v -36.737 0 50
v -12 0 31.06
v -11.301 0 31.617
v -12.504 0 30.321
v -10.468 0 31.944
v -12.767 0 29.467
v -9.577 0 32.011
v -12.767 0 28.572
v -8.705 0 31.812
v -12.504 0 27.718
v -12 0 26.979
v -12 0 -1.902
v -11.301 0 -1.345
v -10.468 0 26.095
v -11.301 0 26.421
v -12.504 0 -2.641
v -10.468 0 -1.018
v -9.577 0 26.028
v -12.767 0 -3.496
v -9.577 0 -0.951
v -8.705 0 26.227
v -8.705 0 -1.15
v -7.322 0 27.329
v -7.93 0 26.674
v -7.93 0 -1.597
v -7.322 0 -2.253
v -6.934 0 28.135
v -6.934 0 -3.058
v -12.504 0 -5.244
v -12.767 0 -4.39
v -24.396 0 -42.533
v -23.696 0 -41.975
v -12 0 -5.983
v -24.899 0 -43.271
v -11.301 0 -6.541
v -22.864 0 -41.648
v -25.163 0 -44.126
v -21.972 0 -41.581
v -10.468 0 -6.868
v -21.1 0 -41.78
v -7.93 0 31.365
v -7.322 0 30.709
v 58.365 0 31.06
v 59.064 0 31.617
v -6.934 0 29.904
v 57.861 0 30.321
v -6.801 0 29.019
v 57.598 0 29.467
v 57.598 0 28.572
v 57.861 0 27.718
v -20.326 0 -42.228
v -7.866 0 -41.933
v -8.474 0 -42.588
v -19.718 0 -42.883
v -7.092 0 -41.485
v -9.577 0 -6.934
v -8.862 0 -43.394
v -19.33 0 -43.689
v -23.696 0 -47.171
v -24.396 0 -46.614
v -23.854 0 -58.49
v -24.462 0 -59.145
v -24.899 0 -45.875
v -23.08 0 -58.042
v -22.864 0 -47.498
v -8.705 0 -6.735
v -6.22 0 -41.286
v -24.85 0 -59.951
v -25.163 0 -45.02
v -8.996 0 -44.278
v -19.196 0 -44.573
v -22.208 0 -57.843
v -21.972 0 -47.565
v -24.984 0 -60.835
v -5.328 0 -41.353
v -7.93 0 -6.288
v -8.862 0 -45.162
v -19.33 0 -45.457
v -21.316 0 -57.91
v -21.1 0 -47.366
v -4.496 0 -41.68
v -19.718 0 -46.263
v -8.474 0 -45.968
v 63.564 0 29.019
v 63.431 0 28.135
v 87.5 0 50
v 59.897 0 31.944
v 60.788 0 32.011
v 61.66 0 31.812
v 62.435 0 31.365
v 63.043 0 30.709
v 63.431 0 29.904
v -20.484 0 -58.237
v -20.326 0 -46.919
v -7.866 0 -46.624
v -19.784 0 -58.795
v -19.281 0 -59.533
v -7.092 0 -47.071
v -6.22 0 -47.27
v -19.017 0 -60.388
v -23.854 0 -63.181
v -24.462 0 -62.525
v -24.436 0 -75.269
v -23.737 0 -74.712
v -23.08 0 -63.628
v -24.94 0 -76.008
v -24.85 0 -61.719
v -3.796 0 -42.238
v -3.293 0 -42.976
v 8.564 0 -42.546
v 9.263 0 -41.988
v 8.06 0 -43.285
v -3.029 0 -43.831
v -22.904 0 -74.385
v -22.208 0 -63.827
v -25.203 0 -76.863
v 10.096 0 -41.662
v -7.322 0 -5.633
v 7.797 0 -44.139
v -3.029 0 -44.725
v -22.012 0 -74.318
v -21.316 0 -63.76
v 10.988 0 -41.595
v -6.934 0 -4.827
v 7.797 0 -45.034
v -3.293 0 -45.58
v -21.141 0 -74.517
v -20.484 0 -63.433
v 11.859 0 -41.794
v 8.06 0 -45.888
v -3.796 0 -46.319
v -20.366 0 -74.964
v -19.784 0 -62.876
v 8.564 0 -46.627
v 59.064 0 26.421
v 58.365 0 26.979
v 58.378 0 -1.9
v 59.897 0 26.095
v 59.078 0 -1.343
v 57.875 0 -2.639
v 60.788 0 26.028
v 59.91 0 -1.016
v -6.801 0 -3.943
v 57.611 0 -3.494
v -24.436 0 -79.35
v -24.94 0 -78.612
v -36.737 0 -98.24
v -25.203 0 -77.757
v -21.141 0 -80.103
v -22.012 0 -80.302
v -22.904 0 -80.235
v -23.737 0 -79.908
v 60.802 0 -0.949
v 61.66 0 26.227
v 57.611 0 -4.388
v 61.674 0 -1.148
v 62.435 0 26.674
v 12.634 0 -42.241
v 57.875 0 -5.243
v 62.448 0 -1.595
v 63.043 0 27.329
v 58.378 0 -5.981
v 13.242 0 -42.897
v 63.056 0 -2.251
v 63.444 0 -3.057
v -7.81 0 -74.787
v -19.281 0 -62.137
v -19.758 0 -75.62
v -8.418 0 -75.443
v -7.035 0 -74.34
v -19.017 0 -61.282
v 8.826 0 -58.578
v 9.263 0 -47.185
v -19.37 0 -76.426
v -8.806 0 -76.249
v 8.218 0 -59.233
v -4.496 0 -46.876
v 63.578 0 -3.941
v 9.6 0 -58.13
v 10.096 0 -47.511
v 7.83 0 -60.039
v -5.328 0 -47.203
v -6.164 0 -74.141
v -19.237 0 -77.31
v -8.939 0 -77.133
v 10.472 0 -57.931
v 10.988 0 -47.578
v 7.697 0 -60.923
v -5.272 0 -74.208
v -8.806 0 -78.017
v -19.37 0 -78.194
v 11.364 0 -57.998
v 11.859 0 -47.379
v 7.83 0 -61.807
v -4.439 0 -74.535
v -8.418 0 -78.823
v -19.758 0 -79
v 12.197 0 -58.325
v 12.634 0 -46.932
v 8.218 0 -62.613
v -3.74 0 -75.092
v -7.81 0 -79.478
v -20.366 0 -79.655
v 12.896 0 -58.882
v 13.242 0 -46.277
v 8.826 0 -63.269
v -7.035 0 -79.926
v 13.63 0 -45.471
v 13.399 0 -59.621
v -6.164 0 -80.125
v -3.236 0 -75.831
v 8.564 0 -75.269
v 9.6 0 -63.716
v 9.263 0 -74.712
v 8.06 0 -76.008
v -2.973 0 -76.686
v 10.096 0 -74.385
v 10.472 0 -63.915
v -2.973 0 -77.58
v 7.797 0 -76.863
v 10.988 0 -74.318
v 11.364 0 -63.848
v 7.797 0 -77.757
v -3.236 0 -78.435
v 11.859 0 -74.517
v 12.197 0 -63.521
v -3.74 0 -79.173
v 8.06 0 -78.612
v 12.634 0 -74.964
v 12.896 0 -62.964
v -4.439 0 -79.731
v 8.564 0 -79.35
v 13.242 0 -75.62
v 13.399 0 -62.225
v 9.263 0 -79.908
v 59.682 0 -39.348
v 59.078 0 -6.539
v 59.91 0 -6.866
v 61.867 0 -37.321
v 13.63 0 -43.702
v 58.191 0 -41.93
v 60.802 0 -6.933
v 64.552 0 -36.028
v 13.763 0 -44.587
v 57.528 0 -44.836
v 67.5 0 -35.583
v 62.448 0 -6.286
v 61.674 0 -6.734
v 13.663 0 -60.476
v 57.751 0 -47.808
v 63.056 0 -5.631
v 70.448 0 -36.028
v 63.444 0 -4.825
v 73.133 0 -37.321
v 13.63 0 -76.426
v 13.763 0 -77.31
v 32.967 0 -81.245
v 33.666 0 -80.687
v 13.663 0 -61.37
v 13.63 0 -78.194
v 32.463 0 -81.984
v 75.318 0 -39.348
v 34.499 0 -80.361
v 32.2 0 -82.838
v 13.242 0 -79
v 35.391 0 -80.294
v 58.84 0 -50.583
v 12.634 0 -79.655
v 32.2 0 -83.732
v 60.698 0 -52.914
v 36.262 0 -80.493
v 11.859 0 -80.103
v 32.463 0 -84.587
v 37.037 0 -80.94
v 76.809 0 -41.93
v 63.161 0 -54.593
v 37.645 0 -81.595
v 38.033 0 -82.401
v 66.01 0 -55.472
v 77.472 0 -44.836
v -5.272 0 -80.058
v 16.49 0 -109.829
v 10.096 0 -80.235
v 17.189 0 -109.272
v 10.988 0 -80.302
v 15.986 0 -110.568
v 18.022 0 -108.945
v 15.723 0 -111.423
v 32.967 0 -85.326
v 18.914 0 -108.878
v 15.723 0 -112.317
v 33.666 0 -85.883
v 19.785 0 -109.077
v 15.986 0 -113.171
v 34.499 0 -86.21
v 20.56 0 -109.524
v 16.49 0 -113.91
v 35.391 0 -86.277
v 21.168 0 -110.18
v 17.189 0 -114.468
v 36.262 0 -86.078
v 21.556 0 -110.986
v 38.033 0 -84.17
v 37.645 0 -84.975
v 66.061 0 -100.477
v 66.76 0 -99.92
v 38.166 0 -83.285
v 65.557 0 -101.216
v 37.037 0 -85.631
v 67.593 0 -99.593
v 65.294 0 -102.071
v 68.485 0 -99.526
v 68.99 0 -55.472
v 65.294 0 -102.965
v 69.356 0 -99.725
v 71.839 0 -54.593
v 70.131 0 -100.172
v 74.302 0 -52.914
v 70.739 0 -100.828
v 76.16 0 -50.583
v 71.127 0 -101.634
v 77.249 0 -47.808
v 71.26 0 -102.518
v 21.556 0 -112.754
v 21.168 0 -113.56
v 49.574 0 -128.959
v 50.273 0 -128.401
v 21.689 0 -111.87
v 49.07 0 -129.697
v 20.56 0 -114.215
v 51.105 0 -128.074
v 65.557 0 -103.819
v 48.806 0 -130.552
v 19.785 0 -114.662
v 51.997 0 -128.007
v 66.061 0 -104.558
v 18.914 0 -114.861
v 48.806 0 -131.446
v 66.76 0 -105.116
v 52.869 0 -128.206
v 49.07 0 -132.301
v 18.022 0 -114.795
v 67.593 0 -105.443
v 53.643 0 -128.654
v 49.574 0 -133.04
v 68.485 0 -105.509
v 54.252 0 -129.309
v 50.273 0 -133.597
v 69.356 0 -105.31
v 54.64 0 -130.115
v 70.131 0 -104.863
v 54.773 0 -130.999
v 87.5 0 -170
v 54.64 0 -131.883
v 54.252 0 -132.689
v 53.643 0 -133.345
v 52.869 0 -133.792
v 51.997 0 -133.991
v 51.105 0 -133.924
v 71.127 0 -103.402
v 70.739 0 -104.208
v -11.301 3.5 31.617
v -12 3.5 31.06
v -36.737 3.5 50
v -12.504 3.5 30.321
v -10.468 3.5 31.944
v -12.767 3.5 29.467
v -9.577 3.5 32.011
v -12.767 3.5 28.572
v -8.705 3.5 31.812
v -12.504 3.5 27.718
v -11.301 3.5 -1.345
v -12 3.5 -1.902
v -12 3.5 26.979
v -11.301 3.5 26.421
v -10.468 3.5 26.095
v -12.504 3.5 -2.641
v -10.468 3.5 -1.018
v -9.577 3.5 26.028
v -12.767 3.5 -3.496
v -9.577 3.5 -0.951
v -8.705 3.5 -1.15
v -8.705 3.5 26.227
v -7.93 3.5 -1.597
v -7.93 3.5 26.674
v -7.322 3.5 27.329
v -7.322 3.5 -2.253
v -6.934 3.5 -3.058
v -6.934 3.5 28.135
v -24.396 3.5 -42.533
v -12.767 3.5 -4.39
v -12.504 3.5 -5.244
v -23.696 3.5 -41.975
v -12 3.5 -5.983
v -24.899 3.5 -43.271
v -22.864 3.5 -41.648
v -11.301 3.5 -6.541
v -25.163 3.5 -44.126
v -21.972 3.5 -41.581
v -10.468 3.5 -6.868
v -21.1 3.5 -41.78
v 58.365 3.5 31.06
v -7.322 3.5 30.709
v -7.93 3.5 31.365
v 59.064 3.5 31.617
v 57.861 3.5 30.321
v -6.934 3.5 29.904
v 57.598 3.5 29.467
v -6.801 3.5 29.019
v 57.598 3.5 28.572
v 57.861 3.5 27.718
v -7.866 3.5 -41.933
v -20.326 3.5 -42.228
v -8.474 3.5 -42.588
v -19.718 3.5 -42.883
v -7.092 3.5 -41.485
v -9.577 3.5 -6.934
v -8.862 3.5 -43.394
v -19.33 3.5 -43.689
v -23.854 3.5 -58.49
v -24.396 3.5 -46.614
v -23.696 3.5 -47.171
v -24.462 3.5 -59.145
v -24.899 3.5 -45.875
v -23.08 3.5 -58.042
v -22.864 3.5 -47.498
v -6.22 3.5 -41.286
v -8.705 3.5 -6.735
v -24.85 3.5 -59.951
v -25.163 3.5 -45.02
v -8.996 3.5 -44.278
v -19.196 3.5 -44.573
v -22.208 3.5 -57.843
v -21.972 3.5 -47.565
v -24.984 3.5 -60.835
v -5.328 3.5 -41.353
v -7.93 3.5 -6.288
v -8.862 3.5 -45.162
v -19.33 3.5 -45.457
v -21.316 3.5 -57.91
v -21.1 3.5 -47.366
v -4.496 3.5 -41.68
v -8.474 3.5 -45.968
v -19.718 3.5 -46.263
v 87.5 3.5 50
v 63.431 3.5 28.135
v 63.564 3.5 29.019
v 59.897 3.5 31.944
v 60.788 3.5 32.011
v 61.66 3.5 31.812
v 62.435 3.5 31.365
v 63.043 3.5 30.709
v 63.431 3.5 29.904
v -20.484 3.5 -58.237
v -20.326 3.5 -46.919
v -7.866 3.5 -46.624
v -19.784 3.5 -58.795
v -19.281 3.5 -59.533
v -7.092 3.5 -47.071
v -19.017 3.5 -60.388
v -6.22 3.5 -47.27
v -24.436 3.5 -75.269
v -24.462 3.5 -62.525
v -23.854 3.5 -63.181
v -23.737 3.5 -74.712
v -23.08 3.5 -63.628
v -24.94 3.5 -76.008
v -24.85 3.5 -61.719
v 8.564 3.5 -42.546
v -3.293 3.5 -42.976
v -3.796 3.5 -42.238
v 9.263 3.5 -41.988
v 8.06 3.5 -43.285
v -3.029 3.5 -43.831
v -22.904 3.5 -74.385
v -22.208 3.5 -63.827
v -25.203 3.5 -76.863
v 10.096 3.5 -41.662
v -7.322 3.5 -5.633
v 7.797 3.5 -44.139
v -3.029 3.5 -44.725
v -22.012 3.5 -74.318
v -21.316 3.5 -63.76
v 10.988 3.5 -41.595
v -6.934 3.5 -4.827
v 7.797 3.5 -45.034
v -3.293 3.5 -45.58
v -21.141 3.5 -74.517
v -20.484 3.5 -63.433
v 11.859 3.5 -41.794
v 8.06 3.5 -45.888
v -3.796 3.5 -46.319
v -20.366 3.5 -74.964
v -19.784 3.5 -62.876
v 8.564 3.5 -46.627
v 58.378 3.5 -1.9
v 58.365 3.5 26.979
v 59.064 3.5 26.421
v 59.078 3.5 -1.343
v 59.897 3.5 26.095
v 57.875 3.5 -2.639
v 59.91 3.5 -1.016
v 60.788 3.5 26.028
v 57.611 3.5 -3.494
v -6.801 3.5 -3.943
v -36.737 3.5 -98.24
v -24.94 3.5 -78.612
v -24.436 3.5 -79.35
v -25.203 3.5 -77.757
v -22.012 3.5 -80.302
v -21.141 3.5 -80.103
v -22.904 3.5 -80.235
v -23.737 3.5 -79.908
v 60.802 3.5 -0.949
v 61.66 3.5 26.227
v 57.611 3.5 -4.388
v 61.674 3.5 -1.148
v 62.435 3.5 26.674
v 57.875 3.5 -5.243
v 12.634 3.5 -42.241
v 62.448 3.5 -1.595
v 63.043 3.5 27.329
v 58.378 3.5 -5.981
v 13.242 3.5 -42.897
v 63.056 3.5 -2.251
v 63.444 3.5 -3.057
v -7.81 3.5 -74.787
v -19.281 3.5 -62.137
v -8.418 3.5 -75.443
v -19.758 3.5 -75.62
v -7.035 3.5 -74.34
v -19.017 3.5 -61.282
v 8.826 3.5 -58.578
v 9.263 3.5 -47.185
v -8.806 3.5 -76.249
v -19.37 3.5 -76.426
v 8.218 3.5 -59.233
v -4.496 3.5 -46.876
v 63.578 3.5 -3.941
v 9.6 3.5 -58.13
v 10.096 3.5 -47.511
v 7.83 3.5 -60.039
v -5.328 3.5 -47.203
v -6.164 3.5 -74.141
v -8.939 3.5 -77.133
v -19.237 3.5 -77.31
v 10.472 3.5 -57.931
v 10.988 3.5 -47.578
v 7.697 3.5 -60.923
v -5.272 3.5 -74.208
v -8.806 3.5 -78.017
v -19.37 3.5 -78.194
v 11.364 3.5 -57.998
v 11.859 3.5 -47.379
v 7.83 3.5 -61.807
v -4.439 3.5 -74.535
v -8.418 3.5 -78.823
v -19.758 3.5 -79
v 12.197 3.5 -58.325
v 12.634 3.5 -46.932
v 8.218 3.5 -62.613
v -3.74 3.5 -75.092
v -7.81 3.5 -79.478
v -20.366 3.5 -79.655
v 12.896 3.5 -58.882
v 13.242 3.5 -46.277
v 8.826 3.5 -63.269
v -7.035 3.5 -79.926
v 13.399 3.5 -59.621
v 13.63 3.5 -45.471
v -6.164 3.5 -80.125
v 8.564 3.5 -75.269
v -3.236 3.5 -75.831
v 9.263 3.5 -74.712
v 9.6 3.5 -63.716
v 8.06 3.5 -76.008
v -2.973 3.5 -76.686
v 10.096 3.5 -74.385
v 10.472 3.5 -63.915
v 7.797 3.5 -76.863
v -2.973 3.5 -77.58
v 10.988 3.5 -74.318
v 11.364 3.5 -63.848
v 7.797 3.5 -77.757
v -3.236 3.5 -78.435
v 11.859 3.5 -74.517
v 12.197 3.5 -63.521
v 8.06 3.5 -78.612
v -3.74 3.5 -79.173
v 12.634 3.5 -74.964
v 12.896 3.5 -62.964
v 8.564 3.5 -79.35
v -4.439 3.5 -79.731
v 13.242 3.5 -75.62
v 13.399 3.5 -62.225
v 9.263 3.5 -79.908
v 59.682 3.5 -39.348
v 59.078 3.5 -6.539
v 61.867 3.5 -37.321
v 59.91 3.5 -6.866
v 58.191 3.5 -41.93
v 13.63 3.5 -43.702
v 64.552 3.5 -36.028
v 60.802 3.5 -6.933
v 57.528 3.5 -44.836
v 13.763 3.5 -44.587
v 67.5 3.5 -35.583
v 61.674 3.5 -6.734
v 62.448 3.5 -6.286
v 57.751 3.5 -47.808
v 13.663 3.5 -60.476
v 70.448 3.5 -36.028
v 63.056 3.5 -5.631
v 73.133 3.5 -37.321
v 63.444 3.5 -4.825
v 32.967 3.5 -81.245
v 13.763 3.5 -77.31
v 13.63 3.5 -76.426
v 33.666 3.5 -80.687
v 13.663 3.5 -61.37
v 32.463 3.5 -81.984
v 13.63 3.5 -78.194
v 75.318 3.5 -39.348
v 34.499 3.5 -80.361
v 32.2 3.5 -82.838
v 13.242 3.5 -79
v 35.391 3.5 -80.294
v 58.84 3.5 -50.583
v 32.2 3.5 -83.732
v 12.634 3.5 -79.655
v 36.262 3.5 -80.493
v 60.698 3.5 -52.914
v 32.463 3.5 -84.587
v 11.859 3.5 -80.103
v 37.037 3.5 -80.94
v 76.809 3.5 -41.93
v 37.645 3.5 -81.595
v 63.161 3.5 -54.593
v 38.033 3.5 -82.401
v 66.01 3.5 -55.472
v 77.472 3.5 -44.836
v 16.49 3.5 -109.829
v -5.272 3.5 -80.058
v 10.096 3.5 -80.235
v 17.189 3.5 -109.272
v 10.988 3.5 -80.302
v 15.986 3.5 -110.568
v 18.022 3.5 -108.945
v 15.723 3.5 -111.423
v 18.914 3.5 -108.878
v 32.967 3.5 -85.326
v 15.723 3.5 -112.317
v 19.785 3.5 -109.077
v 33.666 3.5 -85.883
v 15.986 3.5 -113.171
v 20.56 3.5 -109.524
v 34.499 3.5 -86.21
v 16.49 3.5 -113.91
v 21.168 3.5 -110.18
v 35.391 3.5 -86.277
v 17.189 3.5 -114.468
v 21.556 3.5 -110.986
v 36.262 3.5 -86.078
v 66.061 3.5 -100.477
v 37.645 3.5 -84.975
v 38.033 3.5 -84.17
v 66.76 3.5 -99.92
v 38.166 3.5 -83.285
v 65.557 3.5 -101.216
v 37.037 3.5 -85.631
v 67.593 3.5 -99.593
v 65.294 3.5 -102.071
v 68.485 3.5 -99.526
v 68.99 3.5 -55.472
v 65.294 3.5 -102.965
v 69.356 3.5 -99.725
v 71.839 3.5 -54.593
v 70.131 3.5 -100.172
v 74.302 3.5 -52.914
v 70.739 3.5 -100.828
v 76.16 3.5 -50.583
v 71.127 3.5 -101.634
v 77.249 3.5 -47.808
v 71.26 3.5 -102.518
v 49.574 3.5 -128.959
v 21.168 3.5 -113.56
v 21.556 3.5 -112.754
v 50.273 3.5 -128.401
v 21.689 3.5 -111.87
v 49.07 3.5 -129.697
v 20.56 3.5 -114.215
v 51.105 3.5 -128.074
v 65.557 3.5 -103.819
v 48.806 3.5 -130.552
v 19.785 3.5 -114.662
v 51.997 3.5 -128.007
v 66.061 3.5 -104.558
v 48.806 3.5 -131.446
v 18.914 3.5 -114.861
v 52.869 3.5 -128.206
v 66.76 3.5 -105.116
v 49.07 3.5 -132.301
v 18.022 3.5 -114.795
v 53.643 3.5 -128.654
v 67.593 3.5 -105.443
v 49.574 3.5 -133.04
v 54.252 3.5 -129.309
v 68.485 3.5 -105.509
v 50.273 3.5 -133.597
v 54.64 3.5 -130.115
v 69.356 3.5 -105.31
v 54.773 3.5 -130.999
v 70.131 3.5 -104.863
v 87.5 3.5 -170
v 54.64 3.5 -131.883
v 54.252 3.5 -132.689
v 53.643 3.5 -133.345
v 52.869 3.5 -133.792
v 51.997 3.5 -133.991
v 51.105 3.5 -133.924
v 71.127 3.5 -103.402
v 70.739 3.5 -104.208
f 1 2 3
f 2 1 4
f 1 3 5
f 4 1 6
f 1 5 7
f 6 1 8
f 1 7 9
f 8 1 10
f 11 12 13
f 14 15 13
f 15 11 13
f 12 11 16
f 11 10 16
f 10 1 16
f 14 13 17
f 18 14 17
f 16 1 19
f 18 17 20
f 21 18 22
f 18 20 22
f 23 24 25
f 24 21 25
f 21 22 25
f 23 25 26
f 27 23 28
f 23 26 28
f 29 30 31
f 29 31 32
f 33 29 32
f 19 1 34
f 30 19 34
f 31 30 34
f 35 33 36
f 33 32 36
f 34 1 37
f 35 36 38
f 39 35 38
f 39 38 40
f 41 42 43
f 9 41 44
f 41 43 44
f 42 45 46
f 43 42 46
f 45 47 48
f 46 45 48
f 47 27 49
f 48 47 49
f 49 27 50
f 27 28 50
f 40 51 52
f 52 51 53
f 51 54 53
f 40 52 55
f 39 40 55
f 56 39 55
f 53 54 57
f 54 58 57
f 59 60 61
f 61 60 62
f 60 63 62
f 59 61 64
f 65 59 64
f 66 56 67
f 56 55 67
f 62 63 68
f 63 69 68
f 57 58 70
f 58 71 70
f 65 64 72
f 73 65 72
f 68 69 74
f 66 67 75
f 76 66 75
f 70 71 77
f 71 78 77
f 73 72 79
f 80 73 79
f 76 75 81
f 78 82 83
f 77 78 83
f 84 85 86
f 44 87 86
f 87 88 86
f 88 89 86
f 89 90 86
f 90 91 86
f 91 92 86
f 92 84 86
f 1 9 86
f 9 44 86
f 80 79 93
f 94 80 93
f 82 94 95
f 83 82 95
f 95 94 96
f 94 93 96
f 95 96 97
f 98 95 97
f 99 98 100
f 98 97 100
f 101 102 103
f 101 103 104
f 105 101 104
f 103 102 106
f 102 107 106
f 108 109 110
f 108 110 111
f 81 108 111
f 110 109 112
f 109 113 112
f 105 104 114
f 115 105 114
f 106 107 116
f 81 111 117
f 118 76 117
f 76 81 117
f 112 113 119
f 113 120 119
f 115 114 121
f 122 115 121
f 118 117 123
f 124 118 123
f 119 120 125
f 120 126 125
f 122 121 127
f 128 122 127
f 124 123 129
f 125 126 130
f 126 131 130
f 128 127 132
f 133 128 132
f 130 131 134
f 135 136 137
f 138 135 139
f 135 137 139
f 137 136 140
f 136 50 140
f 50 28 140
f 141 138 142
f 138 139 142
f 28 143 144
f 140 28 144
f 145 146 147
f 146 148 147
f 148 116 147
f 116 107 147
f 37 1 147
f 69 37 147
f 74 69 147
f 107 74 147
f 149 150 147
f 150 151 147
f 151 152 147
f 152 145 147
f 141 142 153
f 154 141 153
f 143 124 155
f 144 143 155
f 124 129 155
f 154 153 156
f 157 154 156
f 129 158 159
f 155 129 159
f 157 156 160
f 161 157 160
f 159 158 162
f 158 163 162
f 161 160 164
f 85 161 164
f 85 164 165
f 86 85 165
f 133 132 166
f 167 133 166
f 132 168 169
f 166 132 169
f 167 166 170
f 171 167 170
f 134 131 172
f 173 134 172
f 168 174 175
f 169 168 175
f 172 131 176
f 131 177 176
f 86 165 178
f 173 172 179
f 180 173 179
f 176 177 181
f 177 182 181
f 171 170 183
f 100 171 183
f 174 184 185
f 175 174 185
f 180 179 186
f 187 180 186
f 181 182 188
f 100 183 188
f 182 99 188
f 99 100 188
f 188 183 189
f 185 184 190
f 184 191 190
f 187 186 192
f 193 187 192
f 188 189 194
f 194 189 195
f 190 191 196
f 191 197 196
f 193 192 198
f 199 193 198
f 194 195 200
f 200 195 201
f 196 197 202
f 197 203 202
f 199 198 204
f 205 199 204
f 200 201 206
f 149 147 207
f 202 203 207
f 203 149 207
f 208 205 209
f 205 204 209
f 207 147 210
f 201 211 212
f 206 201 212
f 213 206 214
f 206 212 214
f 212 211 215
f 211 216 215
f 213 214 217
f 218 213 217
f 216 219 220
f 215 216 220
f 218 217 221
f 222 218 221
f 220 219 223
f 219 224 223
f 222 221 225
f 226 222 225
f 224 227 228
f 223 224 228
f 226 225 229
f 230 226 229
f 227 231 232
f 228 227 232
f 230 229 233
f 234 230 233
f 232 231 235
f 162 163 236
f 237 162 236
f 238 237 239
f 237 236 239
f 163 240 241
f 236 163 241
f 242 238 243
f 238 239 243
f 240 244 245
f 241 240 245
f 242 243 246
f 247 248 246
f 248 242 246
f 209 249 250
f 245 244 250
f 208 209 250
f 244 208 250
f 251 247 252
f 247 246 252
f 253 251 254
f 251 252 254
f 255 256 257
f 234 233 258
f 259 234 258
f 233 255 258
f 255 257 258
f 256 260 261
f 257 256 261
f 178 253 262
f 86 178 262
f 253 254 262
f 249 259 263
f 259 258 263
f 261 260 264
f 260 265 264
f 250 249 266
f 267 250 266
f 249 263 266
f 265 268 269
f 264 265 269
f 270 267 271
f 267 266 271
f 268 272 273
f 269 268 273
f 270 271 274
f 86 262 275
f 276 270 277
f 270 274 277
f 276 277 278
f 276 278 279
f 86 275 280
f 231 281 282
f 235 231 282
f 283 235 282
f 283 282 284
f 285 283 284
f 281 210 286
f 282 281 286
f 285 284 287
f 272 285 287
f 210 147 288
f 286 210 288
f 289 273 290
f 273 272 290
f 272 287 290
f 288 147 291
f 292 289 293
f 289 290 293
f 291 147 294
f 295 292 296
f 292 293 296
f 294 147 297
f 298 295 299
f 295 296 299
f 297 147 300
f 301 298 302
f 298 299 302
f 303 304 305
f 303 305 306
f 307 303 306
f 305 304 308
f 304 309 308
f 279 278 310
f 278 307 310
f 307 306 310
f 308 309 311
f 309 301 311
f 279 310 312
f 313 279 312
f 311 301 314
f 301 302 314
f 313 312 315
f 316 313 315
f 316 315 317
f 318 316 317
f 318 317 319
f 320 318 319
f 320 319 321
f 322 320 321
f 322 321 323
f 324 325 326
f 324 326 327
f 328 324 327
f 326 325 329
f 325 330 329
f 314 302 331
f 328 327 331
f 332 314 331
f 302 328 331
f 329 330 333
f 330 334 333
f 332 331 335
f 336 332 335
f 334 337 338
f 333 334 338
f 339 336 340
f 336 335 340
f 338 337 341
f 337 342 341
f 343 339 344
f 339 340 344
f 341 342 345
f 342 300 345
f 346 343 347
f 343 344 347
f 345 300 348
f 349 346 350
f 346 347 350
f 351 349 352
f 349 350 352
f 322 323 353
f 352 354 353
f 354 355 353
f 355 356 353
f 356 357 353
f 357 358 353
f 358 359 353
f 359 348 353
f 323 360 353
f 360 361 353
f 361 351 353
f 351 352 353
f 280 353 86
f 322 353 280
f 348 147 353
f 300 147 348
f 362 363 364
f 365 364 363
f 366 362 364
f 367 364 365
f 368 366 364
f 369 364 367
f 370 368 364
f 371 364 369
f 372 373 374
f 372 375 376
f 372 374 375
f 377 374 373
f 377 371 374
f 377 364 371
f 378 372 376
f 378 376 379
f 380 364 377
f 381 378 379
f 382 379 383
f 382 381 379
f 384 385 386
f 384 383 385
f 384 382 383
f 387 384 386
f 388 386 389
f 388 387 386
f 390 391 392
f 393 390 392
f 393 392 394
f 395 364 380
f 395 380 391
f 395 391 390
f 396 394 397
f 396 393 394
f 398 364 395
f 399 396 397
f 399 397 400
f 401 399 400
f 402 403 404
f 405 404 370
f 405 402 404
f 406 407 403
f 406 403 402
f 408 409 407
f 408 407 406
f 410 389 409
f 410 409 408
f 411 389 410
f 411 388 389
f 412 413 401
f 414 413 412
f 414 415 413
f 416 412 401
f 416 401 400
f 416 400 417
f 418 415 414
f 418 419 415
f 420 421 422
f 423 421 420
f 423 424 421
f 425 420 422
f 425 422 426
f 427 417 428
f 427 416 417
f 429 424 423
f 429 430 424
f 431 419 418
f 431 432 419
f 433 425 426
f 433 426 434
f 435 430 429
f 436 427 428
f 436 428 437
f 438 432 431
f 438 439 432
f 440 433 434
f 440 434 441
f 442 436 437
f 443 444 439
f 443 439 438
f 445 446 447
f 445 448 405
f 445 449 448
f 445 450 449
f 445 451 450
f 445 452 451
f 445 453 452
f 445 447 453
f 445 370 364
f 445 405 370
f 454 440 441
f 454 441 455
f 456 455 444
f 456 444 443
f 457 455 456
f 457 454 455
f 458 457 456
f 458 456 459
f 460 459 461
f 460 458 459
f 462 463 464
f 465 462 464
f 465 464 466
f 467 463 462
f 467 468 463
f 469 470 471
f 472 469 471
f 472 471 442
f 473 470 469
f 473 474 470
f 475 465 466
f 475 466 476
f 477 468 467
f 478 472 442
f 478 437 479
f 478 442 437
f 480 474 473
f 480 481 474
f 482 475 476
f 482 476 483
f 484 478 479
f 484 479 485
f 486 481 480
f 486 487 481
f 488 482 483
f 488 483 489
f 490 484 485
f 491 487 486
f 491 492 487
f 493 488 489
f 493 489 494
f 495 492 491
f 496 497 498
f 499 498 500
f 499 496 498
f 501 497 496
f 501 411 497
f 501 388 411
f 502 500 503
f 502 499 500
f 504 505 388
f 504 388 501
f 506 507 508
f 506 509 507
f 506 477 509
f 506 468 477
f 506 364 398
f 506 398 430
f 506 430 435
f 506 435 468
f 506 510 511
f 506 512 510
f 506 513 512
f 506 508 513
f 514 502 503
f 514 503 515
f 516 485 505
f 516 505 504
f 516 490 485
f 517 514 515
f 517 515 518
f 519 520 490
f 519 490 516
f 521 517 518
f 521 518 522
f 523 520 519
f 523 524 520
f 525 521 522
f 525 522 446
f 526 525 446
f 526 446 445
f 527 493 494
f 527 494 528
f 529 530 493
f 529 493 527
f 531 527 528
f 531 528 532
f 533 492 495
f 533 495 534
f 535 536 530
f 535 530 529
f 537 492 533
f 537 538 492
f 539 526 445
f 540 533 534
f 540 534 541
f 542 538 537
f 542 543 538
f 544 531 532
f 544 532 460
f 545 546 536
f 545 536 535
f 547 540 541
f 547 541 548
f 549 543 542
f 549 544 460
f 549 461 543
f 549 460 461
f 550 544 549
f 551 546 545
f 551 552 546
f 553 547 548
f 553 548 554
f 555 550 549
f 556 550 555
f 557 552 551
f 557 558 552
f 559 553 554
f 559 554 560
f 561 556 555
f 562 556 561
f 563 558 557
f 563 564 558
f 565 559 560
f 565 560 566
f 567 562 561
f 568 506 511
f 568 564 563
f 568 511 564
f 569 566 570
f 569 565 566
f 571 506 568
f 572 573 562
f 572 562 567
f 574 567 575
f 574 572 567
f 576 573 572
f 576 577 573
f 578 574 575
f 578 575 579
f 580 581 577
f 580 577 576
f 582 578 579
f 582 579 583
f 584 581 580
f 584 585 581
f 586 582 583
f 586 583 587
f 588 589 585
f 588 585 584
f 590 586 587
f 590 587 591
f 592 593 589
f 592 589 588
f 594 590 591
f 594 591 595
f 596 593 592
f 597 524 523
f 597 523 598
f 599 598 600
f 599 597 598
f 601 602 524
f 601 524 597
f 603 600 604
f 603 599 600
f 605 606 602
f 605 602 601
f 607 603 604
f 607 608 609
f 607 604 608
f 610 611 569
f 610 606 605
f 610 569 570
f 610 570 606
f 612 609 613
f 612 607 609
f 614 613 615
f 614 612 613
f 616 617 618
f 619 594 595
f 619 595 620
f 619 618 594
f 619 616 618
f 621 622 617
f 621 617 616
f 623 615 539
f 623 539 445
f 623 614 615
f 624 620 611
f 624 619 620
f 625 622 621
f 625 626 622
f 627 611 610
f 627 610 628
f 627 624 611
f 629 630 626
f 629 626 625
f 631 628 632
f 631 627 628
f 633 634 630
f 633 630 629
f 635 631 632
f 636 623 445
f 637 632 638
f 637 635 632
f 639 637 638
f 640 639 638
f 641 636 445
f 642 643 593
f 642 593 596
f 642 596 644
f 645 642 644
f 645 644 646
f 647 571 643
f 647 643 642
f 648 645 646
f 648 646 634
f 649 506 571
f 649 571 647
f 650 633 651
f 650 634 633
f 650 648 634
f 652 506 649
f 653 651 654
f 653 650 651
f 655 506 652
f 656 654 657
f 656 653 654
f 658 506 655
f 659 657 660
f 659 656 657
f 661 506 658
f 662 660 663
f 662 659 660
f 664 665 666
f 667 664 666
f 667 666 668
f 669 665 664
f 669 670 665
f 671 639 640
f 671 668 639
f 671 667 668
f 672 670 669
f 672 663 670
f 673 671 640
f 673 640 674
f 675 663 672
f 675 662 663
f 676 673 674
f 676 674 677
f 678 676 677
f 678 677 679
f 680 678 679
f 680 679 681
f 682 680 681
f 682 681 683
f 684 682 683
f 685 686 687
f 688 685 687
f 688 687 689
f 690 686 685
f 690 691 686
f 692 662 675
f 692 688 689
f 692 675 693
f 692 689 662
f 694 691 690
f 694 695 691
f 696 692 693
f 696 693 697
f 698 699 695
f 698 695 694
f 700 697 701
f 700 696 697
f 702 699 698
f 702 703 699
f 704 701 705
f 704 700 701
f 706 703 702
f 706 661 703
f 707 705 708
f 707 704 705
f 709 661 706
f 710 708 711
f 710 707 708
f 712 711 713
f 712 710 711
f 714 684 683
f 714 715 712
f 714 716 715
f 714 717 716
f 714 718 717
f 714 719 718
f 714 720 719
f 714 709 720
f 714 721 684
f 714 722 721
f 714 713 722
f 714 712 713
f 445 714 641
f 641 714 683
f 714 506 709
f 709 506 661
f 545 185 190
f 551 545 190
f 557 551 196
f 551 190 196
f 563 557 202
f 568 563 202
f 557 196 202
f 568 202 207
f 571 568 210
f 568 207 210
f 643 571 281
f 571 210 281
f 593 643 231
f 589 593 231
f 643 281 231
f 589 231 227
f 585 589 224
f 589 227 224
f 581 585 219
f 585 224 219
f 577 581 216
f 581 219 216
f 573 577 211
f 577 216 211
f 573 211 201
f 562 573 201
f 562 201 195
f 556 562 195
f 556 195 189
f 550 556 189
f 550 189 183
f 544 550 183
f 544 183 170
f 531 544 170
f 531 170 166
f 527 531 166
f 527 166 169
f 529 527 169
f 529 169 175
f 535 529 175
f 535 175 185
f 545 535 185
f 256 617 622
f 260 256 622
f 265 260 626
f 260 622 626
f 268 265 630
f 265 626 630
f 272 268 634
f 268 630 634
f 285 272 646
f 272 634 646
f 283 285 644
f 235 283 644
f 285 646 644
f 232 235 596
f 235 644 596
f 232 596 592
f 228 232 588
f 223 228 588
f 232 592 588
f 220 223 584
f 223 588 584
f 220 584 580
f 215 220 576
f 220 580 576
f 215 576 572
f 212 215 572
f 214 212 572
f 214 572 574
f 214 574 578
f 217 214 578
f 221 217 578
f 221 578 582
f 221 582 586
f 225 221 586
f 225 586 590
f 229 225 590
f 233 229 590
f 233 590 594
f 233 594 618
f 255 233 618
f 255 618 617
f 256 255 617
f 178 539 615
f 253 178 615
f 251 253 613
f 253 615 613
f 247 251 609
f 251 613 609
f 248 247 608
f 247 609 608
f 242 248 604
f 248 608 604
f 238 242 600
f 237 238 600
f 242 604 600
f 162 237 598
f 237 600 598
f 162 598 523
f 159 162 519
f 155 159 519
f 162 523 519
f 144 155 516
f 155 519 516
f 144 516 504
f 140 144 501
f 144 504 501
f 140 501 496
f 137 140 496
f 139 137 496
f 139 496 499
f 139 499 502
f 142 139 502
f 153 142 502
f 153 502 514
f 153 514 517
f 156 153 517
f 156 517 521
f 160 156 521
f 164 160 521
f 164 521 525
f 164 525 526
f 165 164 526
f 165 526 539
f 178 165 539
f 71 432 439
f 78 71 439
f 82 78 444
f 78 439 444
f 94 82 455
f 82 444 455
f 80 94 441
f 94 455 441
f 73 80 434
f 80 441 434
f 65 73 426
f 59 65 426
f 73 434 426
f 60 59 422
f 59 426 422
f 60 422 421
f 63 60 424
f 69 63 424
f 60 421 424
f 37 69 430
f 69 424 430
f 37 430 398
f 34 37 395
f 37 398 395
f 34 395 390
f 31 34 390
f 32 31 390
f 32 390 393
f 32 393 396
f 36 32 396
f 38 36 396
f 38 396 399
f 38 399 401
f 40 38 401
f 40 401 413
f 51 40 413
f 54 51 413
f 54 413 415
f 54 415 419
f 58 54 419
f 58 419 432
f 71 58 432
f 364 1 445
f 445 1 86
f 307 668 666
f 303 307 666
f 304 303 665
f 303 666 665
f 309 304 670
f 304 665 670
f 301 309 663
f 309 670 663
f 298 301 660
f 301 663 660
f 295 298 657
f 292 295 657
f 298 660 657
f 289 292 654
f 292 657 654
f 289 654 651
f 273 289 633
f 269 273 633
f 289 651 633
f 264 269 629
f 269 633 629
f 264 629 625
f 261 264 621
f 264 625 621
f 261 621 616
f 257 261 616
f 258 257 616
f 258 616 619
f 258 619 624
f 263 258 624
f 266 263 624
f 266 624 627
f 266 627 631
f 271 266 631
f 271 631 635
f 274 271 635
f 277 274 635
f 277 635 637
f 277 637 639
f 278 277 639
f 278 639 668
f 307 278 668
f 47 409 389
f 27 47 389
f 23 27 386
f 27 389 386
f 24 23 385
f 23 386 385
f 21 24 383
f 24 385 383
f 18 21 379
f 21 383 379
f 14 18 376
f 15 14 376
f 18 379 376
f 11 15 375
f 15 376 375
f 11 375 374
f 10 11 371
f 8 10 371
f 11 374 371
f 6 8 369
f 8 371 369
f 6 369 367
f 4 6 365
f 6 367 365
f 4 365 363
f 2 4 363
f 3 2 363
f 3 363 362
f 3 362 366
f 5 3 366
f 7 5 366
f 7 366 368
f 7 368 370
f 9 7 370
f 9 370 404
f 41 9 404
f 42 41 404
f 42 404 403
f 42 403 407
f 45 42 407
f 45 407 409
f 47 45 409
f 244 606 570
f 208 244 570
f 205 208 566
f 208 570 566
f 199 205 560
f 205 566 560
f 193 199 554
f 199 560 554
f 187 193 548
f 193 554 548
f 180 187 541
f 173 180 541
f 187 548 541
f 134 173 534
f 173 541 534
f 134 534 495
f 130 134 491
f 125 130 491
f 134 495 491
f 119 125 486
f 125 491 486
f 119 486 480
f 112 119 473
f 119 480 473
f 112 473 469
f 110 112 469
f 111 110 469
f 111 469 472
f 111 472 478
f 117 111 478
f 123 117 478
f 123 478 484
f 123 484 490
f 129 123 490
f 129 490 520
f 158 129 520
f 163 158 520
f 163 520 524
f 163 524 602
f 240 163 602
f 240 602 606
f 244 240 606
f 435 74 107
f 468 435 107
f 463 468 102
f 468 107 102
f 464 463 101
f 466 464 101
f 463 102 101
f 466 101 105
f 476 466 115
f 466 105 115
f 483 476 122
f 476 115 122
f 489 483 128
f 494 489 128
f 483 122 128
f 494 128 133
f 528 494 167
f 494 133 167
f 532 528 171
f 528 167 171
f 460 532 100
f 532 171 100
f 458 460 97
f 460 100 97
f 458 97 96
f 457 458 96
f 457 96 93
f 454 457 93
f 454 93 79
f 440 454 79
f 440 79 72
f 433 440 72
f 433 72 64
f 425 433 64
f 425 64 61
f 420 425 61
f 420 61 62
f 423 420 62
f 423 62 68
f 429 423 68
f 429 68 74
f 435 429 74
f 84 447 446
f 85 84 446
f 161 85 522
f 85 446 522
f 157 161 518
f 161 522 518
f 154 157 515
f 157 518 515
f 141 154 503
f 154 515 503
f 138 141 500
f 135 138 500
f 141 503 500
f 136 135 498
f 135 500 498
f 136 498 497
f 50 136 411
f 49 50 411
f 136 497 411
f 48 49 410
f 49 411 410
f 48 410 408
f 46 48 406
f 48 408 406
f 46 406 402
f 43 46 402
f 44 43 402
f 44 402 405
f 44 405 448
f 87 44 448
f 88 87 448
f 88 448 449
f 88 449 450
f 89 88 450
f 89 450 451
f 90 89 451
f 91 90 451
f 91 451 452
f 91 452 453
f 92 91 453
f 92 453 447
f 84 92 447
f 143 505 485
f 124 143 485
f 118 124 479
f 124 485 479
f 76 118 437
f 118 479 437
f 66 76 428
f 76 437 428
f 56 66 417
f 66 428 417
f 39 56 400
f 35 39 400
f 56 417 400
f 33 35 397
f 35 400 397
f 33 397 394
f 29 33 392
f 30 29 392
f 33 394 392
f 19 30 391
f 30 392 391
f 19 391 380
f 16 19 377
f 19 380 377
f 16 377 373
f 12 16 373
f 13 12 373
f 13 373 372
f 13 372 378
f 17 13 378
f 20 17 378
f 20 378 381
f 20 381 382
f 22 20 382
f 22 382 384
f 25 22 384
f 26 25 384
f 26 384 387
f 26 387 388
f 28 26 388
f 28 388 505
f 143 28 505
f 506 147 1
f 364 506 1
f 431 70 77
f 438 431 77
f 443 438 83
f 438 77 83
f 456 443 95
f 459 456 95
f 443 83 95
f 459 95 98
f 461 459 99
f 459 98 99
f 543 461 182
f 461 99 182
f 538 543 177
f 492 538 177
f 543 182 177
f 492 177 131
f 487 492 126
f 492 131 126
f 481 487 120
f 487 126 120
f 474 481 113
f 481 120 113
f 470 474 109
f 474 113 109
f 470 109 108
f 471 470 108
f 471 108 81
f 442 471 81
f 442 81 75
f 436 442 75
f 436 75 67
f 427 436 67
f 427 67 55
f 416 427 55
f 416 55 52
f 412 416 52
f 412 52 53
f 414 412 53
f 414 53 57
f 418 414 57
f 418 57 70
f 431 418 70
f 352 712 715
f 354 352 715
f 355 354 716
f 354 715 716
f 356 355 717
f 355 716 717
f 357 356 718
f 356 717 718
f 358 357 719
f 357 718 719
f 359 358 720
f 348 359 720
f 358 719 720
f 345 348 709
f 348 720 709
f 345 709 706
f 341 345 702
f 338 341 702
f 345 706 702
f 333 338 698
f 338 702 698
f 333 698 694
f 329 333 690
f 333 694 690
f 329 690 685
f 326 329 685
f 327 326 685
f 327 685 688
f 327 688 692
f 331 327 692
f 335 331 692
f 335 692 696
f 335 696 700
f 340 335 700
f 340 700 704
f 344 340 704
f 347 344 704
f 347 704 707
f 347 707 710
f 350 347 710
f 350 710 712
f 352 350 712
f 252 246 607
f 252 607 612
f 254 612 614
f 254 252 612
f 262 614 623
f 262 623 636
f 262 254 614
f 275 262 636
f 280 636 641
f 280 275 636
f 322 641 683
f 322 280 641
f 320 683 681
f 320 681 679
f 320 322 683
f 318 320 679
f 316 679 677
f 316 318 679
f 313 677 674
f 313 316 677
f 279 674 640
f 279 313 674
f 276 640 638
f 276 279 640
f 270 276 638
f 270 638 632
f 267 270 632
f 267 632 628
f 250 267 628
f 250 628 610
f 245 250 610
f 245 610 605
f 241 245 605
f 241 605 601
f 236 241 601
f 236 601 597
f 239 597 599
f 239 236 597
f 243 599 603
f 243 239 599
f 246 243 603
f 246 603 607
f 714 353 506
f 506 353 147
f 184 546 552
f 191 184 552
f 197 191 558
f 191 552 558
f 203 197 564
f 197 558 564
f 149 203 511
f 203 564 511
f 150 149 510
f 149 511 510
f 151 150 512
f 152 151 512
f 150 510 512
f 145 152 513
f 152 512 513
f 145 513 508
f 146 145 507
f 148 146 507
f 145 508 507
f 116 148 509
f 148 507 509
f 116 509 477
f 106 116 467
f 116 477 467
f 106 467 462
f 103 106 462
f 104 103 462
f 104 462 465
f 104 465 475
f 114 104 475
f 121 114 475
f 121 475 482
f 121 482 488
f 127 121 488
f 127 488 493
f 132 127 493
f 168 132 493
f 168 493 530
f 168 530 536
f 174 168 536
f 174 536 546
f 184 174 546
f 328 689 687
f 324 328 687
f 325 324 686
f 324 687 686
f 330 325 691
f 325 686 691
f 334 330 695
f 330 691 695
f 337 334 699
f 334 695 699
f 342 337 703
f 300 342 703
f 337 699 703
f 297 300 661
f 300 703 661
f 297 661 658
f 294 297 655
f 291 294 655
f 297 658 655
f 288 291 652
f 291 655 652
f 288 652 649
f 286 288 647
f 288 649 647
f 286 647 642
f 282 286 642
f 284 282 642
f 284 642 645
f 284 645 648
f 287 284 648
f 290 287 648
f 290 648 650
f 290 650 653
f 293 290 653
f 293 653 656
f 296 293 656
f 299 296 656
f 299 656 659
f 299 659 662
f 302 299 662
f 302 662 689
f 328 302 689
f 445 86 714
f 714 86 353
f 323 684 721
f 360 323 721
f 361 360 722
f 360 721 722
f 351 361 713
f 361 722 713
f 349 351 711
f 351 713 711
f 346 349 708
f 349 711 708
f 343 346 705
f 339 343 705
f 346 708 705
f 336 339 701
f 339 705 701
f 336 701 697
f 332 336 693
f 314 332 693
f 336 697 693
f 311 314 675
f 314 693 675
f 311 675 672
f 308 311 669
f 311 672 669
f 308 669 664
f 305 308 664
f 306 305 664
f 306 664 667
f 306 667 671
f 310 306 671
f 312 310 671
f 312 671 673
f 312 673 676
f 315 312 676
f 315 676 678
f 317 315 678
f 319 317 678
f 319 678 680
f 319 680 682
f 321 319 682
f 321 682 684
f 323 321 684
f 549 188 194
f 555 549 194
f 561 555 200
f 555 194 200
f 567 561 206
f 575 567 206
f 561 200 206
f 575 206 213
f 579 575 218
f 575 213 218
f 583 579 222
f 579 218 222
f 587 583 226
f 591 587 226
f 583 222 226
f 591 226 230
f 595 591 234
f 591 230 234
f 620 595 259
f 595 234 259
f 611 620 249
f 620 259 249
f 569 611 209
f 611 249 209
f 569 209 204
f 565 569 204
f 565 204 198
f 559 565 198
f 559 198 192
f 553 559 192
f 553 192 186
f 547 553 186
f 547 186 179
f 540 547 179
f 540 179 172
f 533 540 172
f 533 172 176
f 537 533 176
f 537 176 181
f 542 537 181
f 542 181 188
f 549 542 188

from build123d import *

# Parameters (mm, degrees)
SKETCH4_R                  = 10
BOSS_EXTRUDE1_DEPTH        = 3.5
F_6_0MM_DOWEL_HOLE3_D      = 6
F_6_0MM_DOWEL_HOLE4_D      = 6
F_6_0MM_DOWEL_HOLE5_D      = 6
F_6_0MM_DOWEL_HOLE6_D      = 6
F_6_0MM_DOWEL_HOLE7_D      = 6
F_6_0MM_DOWEL_HOLE8_D      = 6
F_6_0MM_DOWEL_HOLE9_D      = 6
F_6_0MM_DOWEL_HOLE10_D     = 6
F_6_0MM_DOWEL_HOLE11_D     = 6
F_6_0MM_DOWEL_HOLE12_D     = 6
F_6_0MM_DOWEL_HOLE13_D     = 6
F_6_0MM_DOWEL_HOLE14_D     = 6
F_6_0MM_DOWEL_HOLE15_D     = 6
F_6_0MM_DOWEL_HOLE16_D     = 6
F_6_0MM_DOWEL_HOLE17_D     = 6
F_6_0MM_DOWEL_HOLE17_DEPTH = 30.64
F_6_0MM_DOWEL_HOLE17_TIP   = 1.802581857
F_6_0MM_DOWEL_HOLE18_D     = 6
F_6_0MM_DOWEL_HOLE18_DEPTH = 30.64
F_6_0MM_DOWEL_HOLE18_TIP   = 1.802581857
F_6_0MM_DOWEL_HOLE19_D     = 6
F_6_0MM_DOWEL_HOLE19_DEPTH = 30.64
F_6_0MM_DOWEL_HOLE19_TIP   = 1.802581857
F_6_0MM_DOWEL_HOLE20_D     = 6
F_6_0MM_DOWEL_HOLE20_DEPTH = 30.64
F_6_0MM_DOWEL_HOLE20_TIP   = 1.802581857
F_6_0MM_DOWEL_HOLE21_D     = 6
F_6_0MM_DOWEL_HOLE22_D     = 6
F_6_0MM_DOWEL_HOLE23_D     = 6
F_6_0MM_DOWEL_HOLE24_D     = 6
F_6_0MM_DOWEL_HOLE25_D     = 6
F_6_0MM_DOWEL_HOLE26_D     = 6
F_6_0MM_DOWEL_HOLE27_D     = 6
F_6_0MM_DOWEL_HOLE28_D     = 6
F_6_0MM_DOWEL_HOLE29_D     = 6
F_6_0MM_DOWEL_HOLE30_D     = 6


with BuildPart() as part:
    # Sketch4 → Boss-Extrude1 (new body)
    with BuildSketch(Plane(origin=(0, 0, 0), x_dir=(1, 0, 0), z_dir=(0, 1, 0))):
        Polygon((-36.7366, -50), (87.5, -50), (87.5, 0), (87.5, 130), (87.5, 170), (-36.7366, 98.239824704), (-36.7366, 58.239824704), (-36.7366, 23.58328615), align=None)
        with Locations(Location((67.5, 45.58328615, 0), (0, 0, 270))):
            Circle(SKETCH4_R, mode=Mode.SUBTRACT)
    extrude(amount=BOSS_EXTRUDE1_DEPTH)

    # Ø6.0mm Dowel Hole3 (through all)
    with Locations(Plane(origin=(-105.59791448, -96.5, 23.604755291), x_dir=(-1, 0, 0), z_dir=(0, -1, 0))):
        with Locations((-166.162017209, -5.414641336)):
            Hole(F_6_0MM_DOWEL_HOLE3_D / 2)

    # Ø6.0mm Dowel Hole4 (through all)
    with Locations(Plane(origin=(-105.59791448, 0, 23.604755291), x_dir=(-1, 0, 0), z_dir=(0, -1, 0))):
        with Locations((-166.162017209, -5.414641336)):
            Hole(F_6_0MM_DOWEL_HOLE4_D / 2)

    # Ø6.0mm Dowel Hole5 (through all)
    with Locations(Plane(origin=(-105.59791448, -96.5, 23.604755291), x_dir=(-1, 0, 0), z_dir=(0, -1, 0))):
        with Locations((-166.175485163, 27.545698678)):
            Hole(F_6_0MM_DOWEL_HOLE5_D / 2)

    # Ø6.0mm Dowel Hole6 (through all)
    with Locations(Plane(origin=(-105.59791448, 0, 23.604755291), x_dir=(-1, 0, 0), z_dir=(0, -1, 0))):
        with Locations((-166.175485163, 27.545698678)):
            Hole(F_6_0MM_DOWEL_HOLE6_D / 2)

    # Ø6.0mm Dowel Hole7 (through all)
    with Locations(Plane(origin=(-105.59791448, -96.5, 23.604755291), x_dir=(-1, 0, 0), z_dir=(0, -1, 0))):
        with Locations((-95.797211751, 27.547482752)):
            Hole(F_6_0MM_DOWEL_HOLE7_D / 2)

    # Ø6.0mm Dowel Hole8 (through all)
    with Locations(Plane(origin=(-105.59791448, 0, 23.604755291), x_dir=(-1, 0, 0), z_dir=(0, -1, 0))):
        with Locations((-95.797211751, 27.547482752)):
            Hole(F_6_0MM_DOWEL_HOLE8_D / 2)

    # Ø6.0mm Dowel Hole9 (through all)
    with Locations(Plane(origin=(-105.59791448, -96.5, 23.604755291), x_dir=(-1, 0, 0), z_dir=(0, -1, 0))):
        with Locations((-83.36131448, 100.914726135)):
            Hole(F_6_0MM_DOWEL_HOLE9_D / 2)

    # Ø6.0mm Dowel Hole10 (through all)
    with Locations(Plane(origin=(-105.59791448, 0, 23.604755291), x_dir=(-1, 0, 0), z_dir=(0, -1, 0))):
        with Locations((-83.36131448, 100.914726135)):
            Hole(F_6_0MM_DOWEL_HOLE10_D / 2)

    # Ø6.0mm Dowel Hole11 (through all)
    with Locations(Plane(origin=(-105.59791448, -96.5, 23.604755291), x_dir=(-1, 0, 0), z_dir=(0, -1, 0))):
        with Locations((-116.36131448, 100.914726135)):
            Hole(F_6_0MM_DOWEL_HOLE11_D / 2)

    # Ø6.0mm Dowel Hole12 (through all)
    with Locations(Plane(origin=(-105.59791448, 0, 23.604755291), x_dir=(-1, 0, 0), z_dir=(0, -1, 0))):
        with Locations((-116.36131448, 100.914726135)):
            Hole(F_6_0MM_DOWEL_HOLE12_D / 2)

    # Ø6.0mm Dowel Hole13 (through all)
    with Locations(Plane(origin=(-105.59791448, -96.5, 23.604755291), x_dir=(-1, 0, 0), z_dir=(0, -1, 0))):
        with Locations((-116.36131448, 68.191325462)):
            Hole(F_6_0MM_DOWEL_HOLE13_D / 2)

    # Ø6.0mm Dowel Hole14 (through all)
    with Locations(Plane(origin=(-105.59791448, 0, 23.604755291), x_dir=(-1, 0, 0), z_dir=(0, -1, 0))):
        with Locations((-116.36131448, 68.191325462)):
            Hole(F_6_0MM_DOWEL_HOLE14_D / 2)

    # Ø6.0mm Dowel Hole15 (through all)
    with Locations(Plane(origin=(-105.59791448, -96.5, 23.604755291), x_dir=(-1, 0, 0), z_dir=(0, -1, 0))):
        with Locations((-83.401438286, 68.177816696)):
            Hole(F_6_0MM_DOWEL_HOLE15_D / 2)

    # Ø6.0mm Dowel Hole16 (through all)
    with Locations(Plane(origin=(-105.59791448, 0, 23.604755291), x_dir=(-1, 0, 0), z_dir=(0, -1, 0))):
        with Locations((-83.401438286, 68.177816696)):
            Hole(F_6_0MM_DOWEL_HOLE16_D / 2)

    # Ø6.0mm Dowel Hole17
    with Locations(Plane(origin=(-105.59791448, 3.5, 23.604755291), x_dir=(1, 0, 0), z_dir=(0, 1, 0))):
        with Locations((83.614280544, 84.439845005)):
            Hole(F_6_0MM_DOWEL_HOLE17_D / 2, depth=F_6_0MM_DOWEL_HOLE17_DEPTH)
            with Locations((0, 0, -(F_6_0MM_DOWEL_HOLE17_DEPTH + F_6_0MM_DOWEL_HOLE17_TIP / 2))):  # 118° drill point
                Cone(0, F_6_0MM_DOWEL_HOLE17_D / 2, F_6_0MM_DOWEL_HOLE17_TIP, mode=Mode.SUBTRACT)

    # Ø6.0mm Dowel Hole18
    with Locations(Plane(origin=(-105.59791448, 3.5, 23.604755291), x_dir=(1, 0, 0), z_dir=(0, 1, 0))):
        with Locations((116.294424018, 84.527773094)):
            Hole(F_6_0MM_DOWEL_HOLE18_D / 2, depth=F_6_0MM_DOWEL_HOLE18_DEPTH)
            with Locations((0, 0, -(F_6_0MM_DOWEL_HOLE18_DEPTH + F_6_0MM_DOWEL_HOLE18_TIP / 2))):  # 118° drill point
                Cone(0, F_6_0MM_DOWEL_HOLE18_D / 2, F_6_0MM_DOWEL_HOLE18_TIP, mode=Mode.SUBTRACT)

    # Ø6.0mm Dowel Hole19
    with Locations(Plane(origin=(-105.59791448, 3.5, 23.604755291), x_dir=(1, 0, 0), z_dir=(0, 1, 0))):
        with Locations((99.602293645, 67.882806011)):
            Hole(F_6_0MM_DOWEL_HOLE19_D / 2, depth=F_6_0MM_DOWEL_HOLE19_DEPTH)
            with Locations((0, 0, -(F_6_0MM_DOWEL_HOLE19_DEPTH + F_6_0MM_DOWEL_HOLE19_TIP / 2))):  # 118° drill point
                Cone(0, F_6_0MM_DOWEL_HOLE19_D / 2, F_6_0MM_DOWEL_HOLE19_TIP, mode=Mode.SUBTRACT)

    # Ø6.0mm Dowel Hole20
    with Locations(Plane(origin=(-105.59791448, 3.5, 23.604755291), x_dir=(1, 0, 0), z_dir=(0, 1, 0))):
        with Locations((99.658582024, 100.737664948)):
            Hole(F_6_0MM_DOWEL_HOLE20_D / 2, depth=F_6_0MM_DOWEL_HOLE20_DEPTH)
            with Locations((0, 0, -(F_6_0MM_DOWEL_HOLE20_DEPTH + F_6_0MM_DOWEL_HOLE20_TIP / 2))):  # 118° drill point
                Cone(0, F_6_0MM_DOWEL_HOLE20_D / 2, F_6_0MM_DOWEL_HOLE20_TIP, mode=Mode.SUBTRACT)

    # Ø6.0mm Dowel Hole21 (through all)
    with Locations(Plane(origin=(-105.59791448, -96.5, 23.604755291), x_dir=(-1, 0, 0), z_dir=(0, -1, 0))):
        with Locations((-173.858224897, 126.122531585)):
            Hole(F_6_0MM_DOWEL_HOLE21_D / 2)

    # Ø6.0mm Dowel Hole22 (through all)
    with Locations(Plane(origin=(-105.59791448, 0, 23.604755291), x_dir=(-1, 0, 0), z_dir=(0, -1, 0))):
        with Locations((-173.858224897, 126.122531585)):
            Hole(F_6_0MM_DOWEL_HOLE22_D / 2)

    # Ø6.0mm Dowel Hole23 (through all)
    with Locations(Plane(origin=(-105.59791448, -96.5, 23.604755291), x_dir=(-1, 0, 0), z_dir=(0, -1, 0))):
        with Locations((-157.37079531, 154.603853756)):
            Hole(F_6_0MM_DOWEL_HOLE23_D / 2)

    # Ø6.0mm Dowel Hole24 (through all)
    with Locations(Plane(origin=(-105.59791448, 0, 23.604755291), x_dir=(-1, 0, 0), z_dir=(0, -1, 0))):
        with Locations((-157.37079531, 154.603853756)):
            Hole(F_6_0MM_DOWEL_HOLE24_D / 2)

    # Ø6.0mm Dowel Hole25 (through all)
    with Locations(Plane(origin=(-105.59791448, -96.5, 23.604755291), x_dir=(-1, 0, 0), z_dir=(0, -1, 0))):
        with Locations((-124.287288406, 135.474563451)):
            Hole(F_6_0MM_DOWEL_HOLE25_D / 2)

    # Ø6.0mm Dowel Hole26 (through all)
    with Locations(Plane(origin=(-105.59791448, 0, 23.604755291), x_dir=(-1, 0, 0), z_dir=(0, -1, 0))):
        with Locations((-124.287288406, 135.474563451)):
            Hole(F_6_0MM_DOWEL_HOLE26_D / 2)

    # Ø6.0mm Dowel Hole27 (through all)
    with Locations(Plane(origin=(-105.59791448, -96.5, 23.604755291), x_dir=(-1, 0, 0), z_dir=(0, -1, 0))):
        with Locations((-140.764255961, 106.890061518)):
            Hole(F_6_0MM_DOWEL_HOLE27_D / 2)

    # Ø6.0mm Dowel Hole28 (through all)
    with Locations(Plane(origin=(-105.59791448, 0, 23.604755291), x_dir=(-1, 0, 0), z_dir=(0, -1, 0))):
        with Locations((-140.764255961, 106.890061518)):
            Hole(F_6_0MM_DOWEL_HOLE28_D / 2)

    # Ø6.0mm Dowel Hole29 (through all)
    with Locations(Plane(origin=(-105.59791448, -96.5, 23.604755291), x_dir=(-1, 0, 0), z_dir=(0, -1, 0))):
        with Locations((-95.797211751, -5.414641336)):
            Hole(F_6_0MM_DOWEL_HOLE29_D / 2)

    # Ø6.0mm Dowel Hole30 (through all)
    with Locations(Plane(origin=(-105.59791448, 0, 23.604755291), x_dir=(-1, 0, 0), z_dir=(0, -1, 0))):
        with Locations((-95.797211751, -5.414641336)):
            Hole(F_6_0MM_DOWEL_HOLE30_D / 2)


solid = part.part
